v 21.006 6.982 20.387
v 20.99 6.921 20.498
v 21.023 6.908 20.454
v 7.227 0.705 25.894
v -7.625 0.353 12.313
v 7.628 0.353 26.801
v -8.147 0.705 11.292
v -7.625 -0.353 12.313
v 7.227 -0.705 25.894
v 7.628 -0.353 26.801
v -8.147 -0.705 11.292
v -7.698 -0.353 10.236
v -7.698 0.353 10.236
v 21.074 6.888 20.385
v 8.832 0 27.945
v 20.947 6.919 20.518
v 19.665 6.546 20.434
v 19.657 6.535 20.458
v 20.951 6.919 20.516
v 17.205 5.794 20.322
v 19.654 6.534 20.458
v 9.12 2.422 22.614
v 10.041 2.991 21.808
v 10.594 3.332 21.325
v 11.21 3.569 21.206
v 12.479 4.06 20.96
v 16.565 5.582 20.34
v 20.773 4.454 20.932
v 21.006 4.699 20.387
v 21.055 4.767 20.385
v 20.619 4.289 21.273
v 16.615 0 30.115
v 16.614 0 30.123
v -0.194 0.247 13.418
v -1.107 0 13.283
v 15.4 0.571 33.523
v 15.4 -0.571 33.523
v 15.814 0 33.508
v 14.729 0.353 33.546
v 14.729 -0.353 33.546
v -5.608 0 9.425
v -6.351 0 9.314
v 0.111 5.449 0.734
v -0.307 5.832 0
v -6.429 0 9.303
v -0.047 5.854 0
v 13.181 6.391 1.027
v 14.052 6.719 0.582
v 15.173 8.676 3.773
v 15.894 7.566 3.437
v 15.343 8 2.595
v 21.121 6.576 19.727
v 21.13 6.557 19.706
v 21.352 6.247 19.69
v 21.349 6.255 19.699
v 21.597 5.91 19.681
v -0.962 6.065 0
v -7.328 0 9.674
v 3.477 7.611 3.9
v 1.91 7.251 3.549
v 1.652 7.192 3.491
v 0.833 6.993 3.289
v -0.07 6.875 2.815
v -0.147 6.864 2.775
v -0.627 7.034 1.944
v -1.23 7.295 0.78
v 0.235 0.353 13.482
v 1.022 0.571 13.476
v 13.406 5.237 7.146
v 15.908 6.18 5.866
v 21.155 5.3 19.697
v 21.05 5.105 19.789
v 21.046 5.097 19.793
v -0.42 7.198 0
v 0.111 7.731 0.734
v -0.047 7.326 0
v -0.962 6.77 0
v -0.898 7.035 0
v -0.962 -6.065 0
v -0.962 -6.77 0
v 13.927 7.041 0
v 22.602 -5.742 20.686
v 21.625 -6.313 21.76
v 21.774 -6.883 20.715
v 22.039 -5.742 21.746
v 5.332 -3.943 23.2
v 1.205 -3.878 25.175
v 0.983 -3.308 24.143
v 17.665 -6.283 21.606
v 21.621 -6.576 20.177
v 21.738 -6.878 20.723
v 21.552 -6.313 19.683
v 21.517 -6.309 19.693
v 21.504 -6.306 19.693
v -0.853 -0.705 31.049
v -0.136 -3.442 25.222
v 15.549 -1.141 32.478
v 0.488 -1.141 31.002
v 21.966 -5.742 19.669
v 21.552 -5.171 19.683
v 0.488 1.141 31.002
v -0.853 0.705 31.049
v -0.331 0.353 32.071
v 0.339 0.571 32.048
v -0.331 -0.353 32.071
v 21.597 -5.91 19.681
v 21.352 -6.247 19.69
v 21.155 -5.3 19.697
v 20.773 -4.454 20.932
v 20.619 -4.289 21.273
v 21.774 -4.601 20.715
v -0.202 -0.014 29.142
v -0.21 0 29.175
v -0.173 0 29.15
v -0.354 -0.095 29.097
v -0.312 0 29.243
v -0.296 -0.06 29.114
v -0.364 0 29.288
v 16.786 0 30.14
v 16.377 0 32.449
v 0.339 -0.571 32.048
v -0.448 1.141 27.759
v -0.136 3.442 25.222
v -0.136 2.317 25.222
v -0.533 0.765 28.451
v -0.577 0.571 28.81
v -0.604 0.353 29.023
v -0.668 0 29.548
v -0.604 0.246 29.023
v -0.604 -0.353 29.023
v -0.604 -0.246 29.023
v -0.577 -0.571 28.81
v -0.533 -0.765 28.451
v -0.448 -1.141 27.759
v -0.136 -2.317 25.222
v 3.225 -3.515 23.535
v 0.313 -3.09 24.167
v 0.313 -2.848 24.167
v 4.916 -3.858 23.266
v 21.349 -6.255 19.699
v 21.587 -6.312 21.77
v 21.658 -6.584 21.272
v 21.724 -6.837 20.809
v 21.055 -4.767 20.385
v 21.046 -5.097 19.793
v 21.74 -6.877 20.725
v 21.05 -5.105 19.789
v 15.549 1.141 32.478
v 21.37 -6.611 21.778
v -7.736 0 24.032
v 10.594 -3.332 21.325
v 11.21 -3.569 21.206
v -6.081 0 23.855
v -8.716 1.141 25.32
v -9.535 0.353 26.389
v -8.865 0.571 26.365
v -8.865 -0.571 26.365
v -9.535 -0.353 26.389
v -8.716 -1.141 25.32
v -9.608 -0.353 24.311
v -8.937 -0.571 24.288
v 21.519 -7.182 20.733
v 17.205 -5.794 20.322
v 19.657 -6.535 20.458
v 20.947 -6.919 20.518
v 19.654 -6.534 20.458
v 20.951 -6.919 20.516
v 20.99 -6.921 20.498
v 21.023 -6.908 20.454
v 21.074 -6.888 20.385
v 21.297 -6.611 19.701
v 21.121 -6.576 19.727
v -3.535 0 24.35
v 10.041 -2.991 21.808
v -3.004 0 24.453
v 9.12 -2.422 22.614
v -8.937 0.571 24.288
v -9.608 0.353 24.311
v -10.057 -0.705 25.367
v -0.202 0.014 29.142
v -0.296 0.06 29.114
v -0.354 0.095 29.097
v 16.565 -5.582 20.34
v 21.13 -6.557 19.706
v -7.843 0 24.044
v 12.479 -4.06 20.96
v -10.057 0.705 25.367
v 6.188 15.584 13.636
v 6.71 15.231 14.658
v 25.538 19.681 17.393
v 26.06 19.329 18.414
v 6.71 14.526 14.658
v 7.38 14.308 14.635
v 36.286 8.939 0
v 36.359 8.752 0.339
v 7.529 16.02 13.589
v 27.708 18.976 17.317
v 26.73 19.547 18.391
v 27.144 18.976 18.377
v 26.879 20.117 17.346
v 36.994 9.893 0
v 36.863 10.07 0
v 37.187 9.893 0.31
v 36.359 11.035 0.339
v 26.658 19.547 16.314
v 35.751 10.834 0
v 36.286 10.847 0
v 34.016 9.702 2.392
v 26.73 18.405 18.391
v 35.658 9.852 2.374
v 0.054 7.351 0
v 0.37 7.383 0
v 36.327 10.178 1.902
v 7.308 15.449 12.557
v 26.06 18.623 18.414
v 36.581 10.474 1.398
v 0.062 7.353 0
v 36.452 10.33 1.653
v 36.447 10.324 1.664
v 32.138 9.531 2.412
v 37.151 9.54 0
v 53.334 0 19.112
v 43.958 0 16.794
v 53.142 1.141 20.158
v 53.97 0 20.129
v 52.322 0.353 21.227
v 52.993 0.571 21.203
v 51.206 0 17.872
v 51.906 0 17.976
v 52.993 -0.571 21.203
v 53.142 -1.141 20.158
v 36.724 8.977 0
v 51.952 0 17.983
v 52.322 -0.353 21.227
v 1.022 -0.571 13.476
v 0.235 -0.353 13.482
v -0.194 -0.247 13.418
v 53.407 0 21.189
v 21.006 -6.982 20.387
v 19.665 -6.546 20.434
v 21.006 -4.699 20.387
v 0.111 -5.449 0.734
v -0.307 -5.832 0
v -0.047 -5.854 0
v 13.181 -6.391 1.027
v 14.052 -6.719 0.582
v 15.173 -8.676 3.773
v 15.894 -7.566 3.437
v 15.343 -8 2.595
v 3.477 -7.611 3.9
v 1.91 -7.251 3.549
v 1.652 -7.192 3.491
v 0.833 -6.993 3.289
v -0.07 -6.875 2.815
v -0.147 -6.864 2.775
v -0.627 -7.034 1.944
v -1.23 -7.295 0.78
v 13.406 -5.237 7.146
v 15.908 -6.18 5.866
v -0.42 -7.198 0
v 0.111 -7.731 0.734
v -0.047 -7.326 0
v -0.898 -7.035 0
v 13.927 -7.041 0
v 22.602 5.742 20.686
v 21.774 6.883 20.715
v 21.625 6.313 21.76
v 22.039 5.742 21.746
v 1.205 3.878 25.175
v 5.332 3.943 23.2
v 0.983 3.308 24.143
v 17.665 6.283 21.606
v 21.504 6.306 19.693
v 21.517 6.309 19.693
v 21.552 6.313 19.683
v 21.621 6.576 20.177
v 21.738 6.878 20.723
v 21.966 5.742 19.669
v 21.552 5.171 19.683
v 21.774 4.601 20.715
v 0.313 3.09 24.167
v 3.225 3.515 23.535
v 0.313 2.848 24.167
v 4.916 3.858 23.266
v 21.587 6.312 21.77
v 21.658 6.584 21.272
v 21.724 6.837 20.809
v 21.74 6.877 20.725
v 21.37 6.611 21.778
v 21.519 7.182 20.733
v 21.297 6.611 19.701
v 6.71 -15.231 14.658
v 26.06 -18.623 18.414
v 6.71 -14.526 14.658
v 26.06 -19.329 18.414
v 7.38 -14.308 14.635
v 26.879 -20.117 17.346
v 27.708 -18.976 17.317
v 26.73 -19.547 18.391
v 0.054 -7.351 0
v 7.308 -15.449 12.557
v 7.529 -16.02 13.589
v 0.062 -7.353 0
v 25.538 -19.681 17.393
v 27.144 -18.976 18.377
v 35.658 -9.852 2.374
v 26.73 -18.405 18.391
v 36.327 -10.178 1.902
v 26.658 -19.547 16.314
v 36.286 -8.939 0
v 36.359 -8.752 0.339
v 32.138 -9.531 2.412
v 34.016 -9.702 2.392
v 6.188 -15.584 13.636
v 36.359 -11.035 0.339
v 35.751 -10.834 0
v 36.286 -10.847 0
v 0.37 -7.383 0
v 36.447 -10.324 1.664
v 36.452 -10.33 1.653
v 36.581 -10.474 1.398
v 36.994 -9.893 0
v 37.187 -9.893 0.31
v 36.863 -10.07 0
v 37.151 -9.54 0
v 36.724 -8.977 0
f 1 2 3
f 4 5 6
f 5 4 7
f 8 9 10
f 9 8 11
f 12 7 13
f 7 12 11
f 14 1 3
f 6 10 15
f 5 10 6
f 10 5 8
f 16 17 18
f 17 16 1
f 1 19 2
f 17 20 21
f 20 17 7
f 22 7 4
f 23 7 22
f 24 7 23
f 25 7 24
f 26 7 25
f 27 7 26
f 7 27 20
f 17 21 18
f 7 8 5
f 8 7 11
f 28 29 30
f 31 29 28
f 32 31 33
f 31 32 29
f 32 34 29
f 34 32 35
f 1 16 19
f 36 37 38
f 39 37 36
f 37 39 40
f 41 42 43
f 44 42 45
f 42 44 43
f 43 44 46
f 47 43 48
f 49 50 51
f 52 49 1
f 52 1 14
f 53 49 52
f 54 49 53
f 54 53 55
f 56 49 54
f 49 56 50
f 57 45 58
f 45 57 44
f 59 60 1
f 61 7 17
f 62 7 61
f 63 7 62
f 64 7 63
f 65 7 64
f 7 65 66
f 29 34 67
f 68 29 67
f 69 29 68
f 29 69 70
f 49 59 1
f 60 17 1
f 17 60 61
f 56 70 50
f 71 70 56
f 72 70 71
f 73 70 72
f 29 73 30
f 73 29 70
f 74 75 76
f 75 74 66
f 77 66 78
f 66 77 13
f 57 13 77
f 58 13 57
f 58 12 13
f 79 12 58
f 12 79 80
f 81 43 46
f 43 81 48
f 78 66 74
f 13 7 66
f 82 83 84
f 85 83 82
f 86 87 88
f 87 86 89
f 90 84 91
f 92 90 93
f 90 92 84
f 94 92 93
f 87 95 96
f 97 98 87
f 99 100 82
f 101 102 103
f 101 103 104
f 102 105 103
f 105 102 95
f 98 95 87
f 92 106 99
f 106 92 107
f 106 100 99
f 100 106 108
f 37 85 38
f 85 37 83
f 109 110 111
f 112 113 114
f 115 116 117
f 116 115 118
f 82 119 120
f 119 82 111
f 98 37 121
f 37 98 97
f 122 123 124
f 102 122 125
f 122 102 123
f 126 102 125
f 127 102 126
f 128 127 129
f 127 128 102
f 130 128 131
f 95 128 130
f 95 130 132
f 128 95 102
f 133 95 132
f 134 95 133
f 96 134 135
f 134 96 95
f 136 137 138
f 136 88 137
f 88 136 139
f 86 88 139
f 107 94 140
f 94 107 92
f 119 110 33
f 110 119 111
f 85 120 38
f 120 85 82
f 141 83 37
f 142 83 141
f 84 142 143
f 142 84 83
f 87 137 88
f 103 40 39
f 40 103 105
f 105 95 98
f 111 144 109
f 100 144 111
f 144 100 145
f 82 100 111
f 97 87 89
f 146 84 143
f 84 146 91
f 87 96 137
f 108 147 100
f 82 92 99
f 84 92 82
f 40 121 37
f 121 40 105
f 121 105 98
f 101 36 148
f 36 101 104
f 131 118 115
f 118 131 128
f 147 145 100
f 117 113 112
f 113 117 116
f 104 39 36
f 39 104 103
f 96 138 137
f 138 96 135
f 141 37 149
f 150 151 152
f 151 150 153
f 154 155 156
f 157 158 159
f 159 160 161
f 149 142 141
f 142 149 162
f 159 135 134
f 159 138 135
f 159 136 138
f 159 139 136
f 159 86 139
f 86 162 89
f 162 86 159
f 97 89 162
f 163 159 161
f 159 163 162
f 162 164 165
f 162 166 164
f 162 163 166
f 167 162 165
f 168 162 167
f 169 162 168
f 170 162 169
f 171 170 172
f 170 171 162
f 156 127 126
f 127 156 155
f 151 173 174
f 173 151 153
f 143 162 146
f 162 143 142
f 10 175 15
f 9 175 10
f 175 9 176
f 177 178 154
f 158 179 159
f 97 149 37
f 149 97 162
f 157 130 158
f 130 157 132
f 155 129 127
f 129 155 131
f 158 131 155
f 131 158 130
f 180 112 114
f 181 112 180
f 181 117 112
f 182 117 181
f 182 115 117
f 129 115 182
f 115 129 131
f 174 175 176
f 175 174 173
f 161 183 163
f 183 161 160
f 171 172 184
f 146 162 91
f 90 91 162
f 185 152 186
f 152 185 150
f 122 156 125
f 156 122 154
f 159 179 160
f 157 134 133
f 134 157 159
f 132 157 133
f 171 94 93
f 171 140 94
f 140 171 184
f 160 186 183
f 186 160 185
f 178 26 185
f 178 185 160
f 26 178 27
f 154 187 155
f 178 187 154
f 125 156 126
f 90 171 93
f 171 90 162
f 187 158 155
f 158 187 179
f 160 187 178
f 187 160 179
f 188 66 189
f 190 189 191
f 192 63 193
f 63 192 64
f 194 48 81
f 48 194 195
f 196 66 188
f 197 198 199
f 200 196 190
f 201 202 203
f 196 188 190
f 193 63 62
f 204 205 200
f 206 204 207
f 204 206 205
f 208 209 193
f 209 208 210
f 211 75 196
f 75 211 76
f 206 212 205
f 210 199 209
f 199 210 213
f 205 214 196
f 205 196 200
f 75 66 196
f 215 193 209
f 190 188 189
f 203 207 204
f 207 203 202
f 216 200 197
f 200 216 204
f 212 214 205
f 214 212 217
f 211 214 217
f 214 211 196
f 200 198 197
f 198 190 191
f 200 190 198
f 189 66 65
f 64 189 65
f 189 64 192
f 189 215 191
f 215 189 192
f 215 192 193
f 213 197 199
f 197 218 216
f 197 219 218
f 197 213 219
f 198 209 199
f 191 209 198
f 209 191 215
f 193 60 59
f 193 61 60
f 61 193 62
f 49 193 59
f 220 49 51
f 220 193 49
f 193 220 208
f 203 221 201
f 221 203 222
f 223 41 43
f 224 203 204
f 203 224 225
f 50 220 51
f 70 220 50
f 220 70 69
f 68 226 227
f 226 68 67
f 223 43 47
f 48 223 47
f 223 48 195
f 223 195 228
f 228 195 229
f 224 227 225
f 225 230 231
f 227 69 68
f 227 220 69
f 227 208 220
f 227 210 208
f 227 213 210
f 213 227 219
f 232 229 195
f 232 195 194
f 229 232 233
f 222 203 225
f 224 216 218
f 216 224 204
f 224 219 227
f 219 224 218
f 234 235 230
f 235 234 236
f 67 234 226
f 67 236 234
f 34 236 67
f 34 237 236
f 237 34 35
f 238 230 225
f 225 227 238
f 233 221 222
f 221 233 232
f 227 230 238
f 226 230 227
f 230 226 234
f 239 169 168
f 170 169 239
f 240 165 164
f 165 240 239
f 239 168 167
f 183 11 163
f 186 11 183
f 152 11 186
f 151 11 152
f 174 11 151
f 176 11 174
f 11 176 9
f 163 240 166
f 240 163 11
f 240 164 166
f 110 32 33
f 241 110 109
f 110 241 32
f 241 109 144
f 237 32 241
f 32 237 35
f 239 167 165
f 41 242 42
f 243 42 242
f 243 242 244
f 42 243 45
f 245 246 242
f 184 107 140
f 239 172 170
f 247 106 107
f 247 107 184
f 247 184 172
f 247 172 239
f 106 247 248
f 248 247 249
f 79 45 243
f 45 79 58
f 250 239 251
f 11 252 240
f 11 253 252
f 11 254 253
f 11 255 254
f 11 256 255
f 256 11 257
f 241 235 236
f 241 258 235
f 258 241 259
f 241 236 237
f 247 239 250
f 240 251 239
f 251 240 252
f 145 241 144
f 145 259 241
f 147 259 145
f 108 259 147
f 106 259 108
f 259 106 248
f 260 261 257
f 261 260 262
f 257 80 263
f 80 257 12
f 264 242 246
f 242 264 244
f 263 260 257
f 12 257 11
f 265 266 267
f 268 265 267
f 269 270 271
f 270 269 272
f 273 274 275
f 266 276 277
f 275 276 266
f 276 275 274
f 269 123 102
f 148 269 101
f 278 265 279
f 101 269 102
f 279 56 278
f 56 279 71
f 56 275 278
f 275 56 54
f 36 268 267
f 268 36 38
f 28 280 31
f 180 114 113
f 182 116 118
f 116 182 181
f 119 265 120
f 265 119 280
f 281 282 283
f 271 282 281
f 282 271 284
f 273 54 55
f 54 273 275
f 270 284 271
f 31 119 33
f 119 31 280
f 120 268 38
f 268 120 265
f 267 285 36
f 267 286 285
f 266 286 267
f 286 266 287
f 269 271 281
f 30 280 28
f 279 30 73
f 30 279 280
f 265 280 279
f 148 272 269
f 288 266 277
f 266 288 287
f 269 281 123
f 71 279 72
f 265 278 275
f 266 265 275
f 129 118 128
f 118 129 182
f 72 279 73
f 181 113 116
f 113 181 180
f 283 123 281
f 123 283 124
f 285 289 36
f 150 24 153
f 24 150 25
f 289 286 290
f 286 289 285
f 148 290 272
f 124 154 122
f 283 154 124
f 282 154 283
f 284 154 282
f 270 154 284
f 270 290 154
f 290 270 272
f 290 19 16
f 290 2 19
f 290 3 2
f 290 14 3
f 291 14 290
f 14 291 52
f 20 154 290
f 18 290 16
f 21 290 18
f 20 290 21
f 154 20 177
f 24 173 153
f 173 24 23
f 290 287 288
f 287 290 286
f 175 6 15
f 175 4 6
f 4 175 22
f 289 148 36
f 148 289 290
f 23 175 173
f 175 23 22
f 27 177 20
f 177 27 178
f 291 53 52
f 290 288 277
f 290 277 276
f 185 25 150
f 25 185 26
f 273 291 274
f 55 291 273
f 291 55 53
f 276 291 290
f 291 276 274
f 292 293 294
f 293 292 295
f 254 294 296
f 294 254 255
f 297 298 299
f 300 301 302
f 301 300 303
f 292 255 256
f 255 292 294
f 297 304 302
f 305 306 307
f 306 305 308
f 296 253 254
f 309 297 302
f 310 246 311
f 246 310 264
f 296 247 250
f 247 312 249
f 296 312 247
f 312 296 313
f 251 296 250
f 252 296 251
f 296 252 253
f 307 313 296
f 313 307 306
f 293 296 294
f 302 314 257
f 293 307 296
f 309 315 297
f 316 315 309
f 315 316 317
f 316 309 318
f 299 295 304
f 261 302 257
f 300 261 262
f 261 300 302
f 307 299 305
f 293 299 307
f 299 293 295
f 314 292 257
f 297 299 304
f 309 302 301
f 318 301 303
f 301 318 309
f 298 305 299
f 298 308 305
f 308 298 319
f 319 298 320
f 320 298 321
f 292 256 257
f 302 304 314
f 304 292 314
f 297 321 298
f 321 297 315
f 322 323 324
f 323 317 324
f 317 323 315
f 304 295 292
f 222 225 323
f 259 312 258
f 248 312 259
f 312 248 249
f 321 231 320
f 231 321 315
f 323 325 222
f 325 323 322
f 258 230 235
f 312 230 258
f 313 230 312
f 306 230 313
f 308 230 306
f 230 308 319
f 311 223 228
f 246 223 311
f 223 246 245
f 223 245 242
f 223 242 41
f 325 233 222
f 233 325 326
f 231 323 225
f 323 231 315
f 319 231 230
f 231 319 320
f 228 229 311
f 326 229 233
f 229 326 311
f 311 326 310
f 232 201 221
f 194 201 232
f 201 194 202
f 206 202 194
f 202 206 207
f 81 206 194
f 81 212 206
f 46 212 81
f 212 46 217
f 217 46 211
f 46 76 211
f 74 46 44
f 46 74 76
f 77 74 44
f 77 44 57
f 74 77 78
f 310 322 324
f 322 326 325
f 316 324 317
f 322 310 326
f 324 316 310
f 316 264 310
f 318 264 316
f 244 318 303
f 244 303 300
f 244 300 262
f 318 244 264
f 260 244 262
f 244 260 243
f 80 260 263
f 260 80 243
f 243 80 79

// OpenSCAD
/*
   Origami Duck
   kit wallace

*/
//thickness of 'paper'
thickness=1.2;

body_angle=30;
wing_angle=60;
head_angle=25;

//quality of curves
steps=5;
scale=2;

//  functions for creating the matrices for transforming a single point

function m_translate(v) = [ [1, 0, 0, 0],
                            [0, 1, 0, 0],
                            [0, 0, 1, 0],
                            [v.x, v.y, v.z, 1  ] ];

function m_scale(v) =    [ [v.x, 0, 0, 0],
                            [0, v.y, 0, 0],
                            [0, 0, v.z, 0],
                            [0, 0, 0, 1  ] ];
                            
                            
function m_rotate(v) =  [ [1,  0,         0,        0],
                          [0,  cos(v.x),  sin(v.x), 0],
                          [0, -sin(v.x),  cos(v.x), 0],
                          [0,  0,         0,        1] ]
                      * [ [ cos(v.y), 0,  -sin(v.y), 0],
                          [0,         1,  0,        0],
                          [ sin(v.y), 0,  cos(v.y), 0],
                          [0,         0,  0,        1] ]
                      * [ [ cos(v.z),  sin(v.z), 0, 0],
                          [-sin(v.z),  cos(v.z), 0, 0],
                          [ 0,         0,        1, 0],
                          [ 0,         0,        0, 1] ];
                            
function m_to(centre,normal) = 
      m_rotate([0, atan2(sqrt(pow(normal.x, 2) + pow(normal.y, 2)), normal.z), 0]) 
    * m_rotate([0, 0, atan2(normal.y, normal.x)]) 
    * m_translate(centre);   
   
function m_from(centre,normal) = 
      m_translate(-centre)
    * m_rotate([0, 0, -atan2(normal.y, normal.x)]) 
    * m_rotate([0, -atan2(sqrt(pow(normal.x, 2) + pow(normal.y, 2)), normal.z), 0]); 

function m_rotate_about_line(a,v1,v2) =
      m_from(v1,v2-v1)*m_rotate([0,0,a])*m_to(v1,v2-v1);

function vec3(v) = [v.x, v.y, v.z];
function m_transform(v, m)  = vec3([v.x, v.y, v.z, 1] * m);
 
function face_transform(face,m) =
     [ for (v = face) m_transform(v,m) ];
            
module double(axis) { 
      union() {
          children();
          mirror(axis) children();
      }
  }
module face(s,t=thickness) {
    hull()
    for (i=[0:len(s) -1])
       translate(s[i]) sphere(t/2);     
    } 

module ground(size=50) {
   translate([0,0,-size]) cube(2*size,center=true);
}

  
// vertices
p1=[0,0,0];
p2=[4,0,7.5];
p3=[13.8,0,9.8];
p4=[18.2,0,0];
p5=[26,0,11.5];
p6=[7,0,17];
p7=[10.4,0,10.6];
p8=[7,0,0];
p9=[-5,0,13];
p10=[0,0,12.8];
p11=[-0.5,0,16];
p12=[-3.8,0,6];

$fn=steps;
// faces
body =[p12,p5,p1,p4];
wing=[p1,p2,p3,p4];
neck=[p1,p12,p6,p7,p8];
head=[p7,p6,p11,p10];
beak=[p9,p6,p7];

mbody= m_rotate_about_line(body_angle,p12,p5);
rbody= face_transform(body,mbody);
rwing=face_transform(wing,mbody) ; 
mwing = m_rotate_about_line(-wing_angle,rwing[0],rwing[3]);
rrwing = face_transform(rwing,mwing);

mneck = m_rotate_about_line(head_angle,p12,p6);
rp7= m_transform(p7,mneck);  // has to have a kink

mhead = m_rotate_about_line(head_angle,p6,p11);
rhead=face_transform(head,mhead);
mbeak = m_rotate_about_line(head_angle,p6,p9);
rbeak=face_transform(beak,mbeak);

scale(scale)
difference() {
translate([0,0,-0.5])  // to form a better base
rotate([0,2,0])   // in attempt to get it level - gludgy
  double([0,1,0]) {
    color("blue")
        face(rrwing);

    color("green") 
        face(rbody); 

    color("yellow") {
        face([p12,rp7,p6]);
        face([m_transform(p1,mbody),rp7,p12,m_transform(p8,mbody)]);
    }
    color("red") {
       face(rhead);
       face(rbeak);
   }
  }
  ground();  // clip the base
}
